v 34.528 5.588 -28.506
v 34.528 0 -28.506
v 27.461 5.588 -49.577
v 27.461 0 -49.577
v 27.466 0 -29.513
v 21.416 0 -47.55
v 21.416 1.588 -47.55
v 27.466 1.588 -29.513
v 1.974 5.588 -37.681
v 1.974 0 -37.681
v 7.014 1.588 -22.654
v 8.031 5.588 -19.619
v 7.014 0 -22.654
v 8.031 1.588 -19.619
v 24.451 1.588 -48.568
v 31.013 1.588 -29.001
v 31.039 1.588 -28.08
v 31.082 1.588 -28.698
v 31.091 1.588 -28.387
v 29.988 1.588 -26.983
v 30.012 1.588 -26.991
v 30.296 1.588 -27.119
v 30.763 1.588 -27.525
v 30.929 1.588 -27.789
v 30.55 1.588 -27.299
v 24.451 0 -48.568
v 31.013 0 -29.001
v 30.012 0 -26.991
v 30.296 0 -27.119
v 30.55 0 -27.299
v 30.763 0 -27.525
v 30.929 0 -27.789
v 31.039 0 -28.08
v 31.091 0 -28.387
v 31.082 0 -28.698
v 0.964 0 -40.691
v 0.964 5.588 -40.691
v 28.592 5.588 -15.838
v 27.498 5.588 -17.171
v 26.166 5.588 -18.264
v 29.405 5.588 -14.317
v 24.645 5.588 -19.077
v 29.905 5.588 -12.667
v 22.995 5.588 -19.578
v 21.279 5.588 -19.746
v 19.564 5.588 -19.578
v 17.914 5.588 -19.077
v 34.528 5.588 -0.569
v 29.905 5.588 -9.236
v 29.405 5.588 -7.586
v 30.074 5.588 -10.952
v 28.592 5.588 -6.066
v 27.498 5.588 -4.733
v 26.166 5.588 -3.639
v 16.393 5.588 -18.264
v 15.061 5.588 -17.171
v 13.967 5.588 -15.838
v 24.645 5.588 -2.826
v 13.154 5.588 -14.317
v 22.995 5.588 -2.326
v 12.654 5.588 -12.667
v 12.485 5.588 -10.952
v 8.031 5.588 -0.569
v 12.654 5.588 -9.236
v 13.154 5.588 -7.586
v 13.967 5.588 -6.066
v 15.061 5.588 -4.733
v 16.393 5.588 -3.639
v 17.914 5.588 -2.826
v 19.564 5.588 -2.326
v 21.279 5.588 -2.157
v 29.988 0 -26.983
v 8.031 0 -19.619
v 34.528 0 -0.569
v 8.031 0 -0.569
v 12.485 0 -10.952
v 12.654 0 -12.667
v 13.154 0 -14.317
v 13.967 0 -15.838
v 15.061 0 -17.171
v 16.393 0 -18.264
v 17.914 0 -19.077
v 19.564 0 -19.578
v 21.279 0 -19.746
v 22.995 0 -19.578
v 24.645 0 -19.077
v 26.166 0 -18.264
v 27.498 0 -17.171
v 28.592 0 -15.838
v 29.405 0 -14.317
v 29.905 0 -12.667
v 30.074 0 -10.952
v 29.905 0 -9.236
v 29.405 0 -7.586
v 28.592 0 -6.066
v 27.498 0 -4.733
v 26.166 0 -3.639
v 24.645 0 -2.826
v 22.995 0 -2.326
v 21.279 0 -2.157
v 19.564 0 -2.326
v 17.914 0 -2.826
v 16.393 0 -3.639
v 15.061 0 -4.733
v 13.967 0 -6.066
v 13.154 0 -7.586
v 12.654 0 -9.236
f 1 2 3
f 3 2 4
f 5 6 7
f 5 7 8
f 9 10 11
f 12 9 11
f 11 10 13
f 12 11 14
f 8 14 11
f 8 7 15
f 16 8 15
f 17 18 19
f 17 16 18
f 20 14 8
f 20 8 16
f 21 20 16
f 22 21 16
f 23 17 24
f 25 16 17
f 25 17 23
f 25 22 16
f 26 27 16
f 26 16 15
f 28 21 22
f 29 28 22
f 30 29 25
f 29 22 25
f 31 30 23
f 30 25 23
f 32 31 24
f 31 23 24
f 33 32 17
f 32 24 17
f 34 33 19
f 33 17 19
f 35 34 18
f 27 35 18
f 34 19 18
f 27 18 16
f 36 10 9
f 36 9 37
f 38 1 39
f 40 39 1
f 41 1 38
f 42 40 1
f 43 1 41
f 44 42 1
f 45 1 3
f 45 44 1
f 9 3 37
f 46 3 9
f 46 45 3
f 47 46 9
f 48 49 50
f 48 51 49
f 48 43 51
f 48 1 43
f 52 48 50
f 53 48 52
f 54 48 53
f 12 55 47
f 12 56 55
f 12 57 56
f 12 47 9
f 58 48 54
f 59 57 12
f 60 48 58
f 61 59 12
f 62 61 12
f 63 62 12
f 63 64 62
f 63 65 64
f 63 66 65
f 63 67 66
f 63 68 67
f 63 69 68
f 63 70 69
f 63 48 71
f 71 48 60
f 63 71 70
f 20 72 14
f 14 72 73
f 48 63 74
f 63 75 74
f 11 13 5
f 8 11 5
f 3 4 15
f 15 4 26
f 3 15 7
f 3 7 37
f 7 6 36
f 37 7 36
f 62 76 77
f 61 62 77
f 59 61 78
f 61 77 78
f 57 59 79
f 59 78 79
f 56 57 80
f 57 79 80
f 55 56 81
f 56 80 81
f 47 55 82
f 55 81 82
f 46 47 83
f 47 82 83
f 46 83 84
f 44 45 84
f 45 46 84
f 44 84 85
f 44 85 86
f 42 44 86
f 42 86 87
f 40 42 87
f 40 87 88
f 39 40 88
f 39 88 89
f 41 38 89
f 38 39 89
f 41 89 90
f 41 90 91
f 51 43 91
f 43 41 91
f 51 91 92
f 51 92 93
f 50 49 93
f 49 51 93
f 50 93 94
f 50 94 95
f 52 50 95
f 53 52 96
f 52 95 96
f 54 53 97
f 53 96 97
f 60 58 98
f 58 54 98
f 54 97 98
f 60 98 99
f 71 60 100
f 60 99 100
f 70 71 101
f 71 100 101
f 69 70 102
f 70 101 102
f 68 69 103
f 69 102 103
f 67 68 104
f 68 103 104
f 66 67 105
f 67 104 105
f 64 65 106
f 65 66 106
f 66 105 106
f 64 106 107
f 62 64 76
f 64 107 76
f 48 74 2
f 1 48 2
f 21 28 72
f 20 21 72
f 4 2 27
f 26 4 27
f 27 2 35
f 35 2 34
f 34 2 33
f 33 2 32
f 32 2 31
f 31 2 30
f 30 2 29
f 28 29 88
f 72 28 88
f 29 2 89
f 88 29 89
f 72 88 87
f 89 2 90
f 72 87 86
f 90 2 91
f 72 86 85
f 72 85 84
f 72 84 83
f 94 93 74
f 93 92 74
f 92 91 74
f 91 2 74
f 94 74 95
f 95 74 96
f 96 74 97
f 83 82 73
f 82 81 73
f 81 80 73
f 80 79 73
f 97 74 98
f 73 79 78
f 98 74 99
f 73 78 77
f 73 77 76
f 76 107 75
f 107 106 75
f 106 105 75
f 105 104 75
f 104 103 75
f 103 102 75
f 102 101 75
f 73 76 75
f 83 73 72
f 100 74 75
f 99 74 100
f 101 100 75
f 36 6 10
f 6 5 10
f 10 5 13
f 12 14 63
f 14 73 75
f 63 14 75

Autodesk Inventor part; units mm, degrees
ref_plane "YZ Plane" through (0, 0, 0) normal (1, 0, 0) x (0, 1, 0)
ref_plane "XZ Plane" through (0, 0, 0) normal (0, 1, 0) x (-1, 0, 0)
ref_plane "XY Plane" through (0, 0, 0) normal (0, 0, 1) x (1, 0, 0)
sketch "Sketch1" plane through (0, 0, 0) normal (0, 1, 0) x (-1, 0, 0)
  line L0 (-8.0312, -19.6194) -> (-8.0312, -0.5694)
  line L1 (-8.0312, -0.5694) -> (-34.5277, -0.5694)
  line L2 (-34.5277, -0.5694) -> (-34.5277, -28.5056)
  line L3 (18.6455, 5.0782) -> (18.6456, 5.0782)
  line L4 (-1.974, -37.6808) -> (-8.0312, -19.6194)
  line L5 (-34.5277, -28.5056) -> (-27.4611, -49.5771)
  line L6 (-1.974, -37.6808) -> (-0.9645, -40.691)
  line L7 (-27.4611, -49.5771) -> (-0.9645, -40.691)
  circle A0 centre (-21.2794, -10.9517) radius 8.7948
  line L8 (-8.0312, -0.5694) -> (-8.0312, -19.6194)
  line L9 (-8.0312, -19.6194) -> (-0.9645, -40.691)
  line L10 (-0.9645, -40.691) -> (-27.4611, -49.5771)
  line L11 (-27.4611, -49.5771) -> (-34.5277, -28.5056)
  line L12 (-34.5277, -28.5056) -> (-34.5277, -0.5694)
  line L13 (-34.5277, -0.5694) -> (-8.0312, -0.5694)
  dimension "d0" = 19.05
  dimension "d1" = 22.225
  dimension "d2" = 27.9469
  dimension "d3" = 26.4965
  dimension "d4" = 17.5895
  dimension "d18" = 13.2483
  dimension "d20" = 161.46
  dimension "d22" = 10.3823
extrude "Extrusion1" add sketch "Sketch1" along normal blind 5.588
sketch "Sketch2" plane through (0, 0, 0) normal (0, -1, 0) x (1, 0, 0)
  line L0 (27.4611, -49.5771) -> (0.9645, -40.691) projected
  line L1 (31.5175, -27.4959) -> (29.9883, -26.9832)
  line L2 (34.5277, -28.5056) -> (27.4611, -49.5771) projected
  line L3 (27.4611, -49.5771) -> (0.9645, -40.691) projected
  line L4 (31.5175, -27.4959) -> (8.0312, -19.6194)
  line L5 (8.0312, -19.6194) -> (7.0136, -22.6537)
  line L6 (7.0136, -22.6537) -> (27.4656, -29.5126)
  line L7 (24.4508, -48.5675) -> (21.4165, -47.5499)
  line L8 (21.4165, -47.5499) -> (27.4656, -29.5126)
  line L9 (29.9883, -26.9831) -> (31.5175, -27.4959)
  line L10 (31.5175, -27.4959) -> (24.4508, -48.5675)
  point P0 (0, 0)
  dimension "d15" = 3.2004
  dimension "d16" = 3.175
  dimension "d17" = 3.2004
extrude "Extrusion2" cut sketch "Sketch2" against normal blind 1.5875
fillet "Fillet1" radius 1.5875 1 edges at (31.5175, 0.7937, -27.4959)
properties part number "Lidar Sensor CAse Piece 1"
